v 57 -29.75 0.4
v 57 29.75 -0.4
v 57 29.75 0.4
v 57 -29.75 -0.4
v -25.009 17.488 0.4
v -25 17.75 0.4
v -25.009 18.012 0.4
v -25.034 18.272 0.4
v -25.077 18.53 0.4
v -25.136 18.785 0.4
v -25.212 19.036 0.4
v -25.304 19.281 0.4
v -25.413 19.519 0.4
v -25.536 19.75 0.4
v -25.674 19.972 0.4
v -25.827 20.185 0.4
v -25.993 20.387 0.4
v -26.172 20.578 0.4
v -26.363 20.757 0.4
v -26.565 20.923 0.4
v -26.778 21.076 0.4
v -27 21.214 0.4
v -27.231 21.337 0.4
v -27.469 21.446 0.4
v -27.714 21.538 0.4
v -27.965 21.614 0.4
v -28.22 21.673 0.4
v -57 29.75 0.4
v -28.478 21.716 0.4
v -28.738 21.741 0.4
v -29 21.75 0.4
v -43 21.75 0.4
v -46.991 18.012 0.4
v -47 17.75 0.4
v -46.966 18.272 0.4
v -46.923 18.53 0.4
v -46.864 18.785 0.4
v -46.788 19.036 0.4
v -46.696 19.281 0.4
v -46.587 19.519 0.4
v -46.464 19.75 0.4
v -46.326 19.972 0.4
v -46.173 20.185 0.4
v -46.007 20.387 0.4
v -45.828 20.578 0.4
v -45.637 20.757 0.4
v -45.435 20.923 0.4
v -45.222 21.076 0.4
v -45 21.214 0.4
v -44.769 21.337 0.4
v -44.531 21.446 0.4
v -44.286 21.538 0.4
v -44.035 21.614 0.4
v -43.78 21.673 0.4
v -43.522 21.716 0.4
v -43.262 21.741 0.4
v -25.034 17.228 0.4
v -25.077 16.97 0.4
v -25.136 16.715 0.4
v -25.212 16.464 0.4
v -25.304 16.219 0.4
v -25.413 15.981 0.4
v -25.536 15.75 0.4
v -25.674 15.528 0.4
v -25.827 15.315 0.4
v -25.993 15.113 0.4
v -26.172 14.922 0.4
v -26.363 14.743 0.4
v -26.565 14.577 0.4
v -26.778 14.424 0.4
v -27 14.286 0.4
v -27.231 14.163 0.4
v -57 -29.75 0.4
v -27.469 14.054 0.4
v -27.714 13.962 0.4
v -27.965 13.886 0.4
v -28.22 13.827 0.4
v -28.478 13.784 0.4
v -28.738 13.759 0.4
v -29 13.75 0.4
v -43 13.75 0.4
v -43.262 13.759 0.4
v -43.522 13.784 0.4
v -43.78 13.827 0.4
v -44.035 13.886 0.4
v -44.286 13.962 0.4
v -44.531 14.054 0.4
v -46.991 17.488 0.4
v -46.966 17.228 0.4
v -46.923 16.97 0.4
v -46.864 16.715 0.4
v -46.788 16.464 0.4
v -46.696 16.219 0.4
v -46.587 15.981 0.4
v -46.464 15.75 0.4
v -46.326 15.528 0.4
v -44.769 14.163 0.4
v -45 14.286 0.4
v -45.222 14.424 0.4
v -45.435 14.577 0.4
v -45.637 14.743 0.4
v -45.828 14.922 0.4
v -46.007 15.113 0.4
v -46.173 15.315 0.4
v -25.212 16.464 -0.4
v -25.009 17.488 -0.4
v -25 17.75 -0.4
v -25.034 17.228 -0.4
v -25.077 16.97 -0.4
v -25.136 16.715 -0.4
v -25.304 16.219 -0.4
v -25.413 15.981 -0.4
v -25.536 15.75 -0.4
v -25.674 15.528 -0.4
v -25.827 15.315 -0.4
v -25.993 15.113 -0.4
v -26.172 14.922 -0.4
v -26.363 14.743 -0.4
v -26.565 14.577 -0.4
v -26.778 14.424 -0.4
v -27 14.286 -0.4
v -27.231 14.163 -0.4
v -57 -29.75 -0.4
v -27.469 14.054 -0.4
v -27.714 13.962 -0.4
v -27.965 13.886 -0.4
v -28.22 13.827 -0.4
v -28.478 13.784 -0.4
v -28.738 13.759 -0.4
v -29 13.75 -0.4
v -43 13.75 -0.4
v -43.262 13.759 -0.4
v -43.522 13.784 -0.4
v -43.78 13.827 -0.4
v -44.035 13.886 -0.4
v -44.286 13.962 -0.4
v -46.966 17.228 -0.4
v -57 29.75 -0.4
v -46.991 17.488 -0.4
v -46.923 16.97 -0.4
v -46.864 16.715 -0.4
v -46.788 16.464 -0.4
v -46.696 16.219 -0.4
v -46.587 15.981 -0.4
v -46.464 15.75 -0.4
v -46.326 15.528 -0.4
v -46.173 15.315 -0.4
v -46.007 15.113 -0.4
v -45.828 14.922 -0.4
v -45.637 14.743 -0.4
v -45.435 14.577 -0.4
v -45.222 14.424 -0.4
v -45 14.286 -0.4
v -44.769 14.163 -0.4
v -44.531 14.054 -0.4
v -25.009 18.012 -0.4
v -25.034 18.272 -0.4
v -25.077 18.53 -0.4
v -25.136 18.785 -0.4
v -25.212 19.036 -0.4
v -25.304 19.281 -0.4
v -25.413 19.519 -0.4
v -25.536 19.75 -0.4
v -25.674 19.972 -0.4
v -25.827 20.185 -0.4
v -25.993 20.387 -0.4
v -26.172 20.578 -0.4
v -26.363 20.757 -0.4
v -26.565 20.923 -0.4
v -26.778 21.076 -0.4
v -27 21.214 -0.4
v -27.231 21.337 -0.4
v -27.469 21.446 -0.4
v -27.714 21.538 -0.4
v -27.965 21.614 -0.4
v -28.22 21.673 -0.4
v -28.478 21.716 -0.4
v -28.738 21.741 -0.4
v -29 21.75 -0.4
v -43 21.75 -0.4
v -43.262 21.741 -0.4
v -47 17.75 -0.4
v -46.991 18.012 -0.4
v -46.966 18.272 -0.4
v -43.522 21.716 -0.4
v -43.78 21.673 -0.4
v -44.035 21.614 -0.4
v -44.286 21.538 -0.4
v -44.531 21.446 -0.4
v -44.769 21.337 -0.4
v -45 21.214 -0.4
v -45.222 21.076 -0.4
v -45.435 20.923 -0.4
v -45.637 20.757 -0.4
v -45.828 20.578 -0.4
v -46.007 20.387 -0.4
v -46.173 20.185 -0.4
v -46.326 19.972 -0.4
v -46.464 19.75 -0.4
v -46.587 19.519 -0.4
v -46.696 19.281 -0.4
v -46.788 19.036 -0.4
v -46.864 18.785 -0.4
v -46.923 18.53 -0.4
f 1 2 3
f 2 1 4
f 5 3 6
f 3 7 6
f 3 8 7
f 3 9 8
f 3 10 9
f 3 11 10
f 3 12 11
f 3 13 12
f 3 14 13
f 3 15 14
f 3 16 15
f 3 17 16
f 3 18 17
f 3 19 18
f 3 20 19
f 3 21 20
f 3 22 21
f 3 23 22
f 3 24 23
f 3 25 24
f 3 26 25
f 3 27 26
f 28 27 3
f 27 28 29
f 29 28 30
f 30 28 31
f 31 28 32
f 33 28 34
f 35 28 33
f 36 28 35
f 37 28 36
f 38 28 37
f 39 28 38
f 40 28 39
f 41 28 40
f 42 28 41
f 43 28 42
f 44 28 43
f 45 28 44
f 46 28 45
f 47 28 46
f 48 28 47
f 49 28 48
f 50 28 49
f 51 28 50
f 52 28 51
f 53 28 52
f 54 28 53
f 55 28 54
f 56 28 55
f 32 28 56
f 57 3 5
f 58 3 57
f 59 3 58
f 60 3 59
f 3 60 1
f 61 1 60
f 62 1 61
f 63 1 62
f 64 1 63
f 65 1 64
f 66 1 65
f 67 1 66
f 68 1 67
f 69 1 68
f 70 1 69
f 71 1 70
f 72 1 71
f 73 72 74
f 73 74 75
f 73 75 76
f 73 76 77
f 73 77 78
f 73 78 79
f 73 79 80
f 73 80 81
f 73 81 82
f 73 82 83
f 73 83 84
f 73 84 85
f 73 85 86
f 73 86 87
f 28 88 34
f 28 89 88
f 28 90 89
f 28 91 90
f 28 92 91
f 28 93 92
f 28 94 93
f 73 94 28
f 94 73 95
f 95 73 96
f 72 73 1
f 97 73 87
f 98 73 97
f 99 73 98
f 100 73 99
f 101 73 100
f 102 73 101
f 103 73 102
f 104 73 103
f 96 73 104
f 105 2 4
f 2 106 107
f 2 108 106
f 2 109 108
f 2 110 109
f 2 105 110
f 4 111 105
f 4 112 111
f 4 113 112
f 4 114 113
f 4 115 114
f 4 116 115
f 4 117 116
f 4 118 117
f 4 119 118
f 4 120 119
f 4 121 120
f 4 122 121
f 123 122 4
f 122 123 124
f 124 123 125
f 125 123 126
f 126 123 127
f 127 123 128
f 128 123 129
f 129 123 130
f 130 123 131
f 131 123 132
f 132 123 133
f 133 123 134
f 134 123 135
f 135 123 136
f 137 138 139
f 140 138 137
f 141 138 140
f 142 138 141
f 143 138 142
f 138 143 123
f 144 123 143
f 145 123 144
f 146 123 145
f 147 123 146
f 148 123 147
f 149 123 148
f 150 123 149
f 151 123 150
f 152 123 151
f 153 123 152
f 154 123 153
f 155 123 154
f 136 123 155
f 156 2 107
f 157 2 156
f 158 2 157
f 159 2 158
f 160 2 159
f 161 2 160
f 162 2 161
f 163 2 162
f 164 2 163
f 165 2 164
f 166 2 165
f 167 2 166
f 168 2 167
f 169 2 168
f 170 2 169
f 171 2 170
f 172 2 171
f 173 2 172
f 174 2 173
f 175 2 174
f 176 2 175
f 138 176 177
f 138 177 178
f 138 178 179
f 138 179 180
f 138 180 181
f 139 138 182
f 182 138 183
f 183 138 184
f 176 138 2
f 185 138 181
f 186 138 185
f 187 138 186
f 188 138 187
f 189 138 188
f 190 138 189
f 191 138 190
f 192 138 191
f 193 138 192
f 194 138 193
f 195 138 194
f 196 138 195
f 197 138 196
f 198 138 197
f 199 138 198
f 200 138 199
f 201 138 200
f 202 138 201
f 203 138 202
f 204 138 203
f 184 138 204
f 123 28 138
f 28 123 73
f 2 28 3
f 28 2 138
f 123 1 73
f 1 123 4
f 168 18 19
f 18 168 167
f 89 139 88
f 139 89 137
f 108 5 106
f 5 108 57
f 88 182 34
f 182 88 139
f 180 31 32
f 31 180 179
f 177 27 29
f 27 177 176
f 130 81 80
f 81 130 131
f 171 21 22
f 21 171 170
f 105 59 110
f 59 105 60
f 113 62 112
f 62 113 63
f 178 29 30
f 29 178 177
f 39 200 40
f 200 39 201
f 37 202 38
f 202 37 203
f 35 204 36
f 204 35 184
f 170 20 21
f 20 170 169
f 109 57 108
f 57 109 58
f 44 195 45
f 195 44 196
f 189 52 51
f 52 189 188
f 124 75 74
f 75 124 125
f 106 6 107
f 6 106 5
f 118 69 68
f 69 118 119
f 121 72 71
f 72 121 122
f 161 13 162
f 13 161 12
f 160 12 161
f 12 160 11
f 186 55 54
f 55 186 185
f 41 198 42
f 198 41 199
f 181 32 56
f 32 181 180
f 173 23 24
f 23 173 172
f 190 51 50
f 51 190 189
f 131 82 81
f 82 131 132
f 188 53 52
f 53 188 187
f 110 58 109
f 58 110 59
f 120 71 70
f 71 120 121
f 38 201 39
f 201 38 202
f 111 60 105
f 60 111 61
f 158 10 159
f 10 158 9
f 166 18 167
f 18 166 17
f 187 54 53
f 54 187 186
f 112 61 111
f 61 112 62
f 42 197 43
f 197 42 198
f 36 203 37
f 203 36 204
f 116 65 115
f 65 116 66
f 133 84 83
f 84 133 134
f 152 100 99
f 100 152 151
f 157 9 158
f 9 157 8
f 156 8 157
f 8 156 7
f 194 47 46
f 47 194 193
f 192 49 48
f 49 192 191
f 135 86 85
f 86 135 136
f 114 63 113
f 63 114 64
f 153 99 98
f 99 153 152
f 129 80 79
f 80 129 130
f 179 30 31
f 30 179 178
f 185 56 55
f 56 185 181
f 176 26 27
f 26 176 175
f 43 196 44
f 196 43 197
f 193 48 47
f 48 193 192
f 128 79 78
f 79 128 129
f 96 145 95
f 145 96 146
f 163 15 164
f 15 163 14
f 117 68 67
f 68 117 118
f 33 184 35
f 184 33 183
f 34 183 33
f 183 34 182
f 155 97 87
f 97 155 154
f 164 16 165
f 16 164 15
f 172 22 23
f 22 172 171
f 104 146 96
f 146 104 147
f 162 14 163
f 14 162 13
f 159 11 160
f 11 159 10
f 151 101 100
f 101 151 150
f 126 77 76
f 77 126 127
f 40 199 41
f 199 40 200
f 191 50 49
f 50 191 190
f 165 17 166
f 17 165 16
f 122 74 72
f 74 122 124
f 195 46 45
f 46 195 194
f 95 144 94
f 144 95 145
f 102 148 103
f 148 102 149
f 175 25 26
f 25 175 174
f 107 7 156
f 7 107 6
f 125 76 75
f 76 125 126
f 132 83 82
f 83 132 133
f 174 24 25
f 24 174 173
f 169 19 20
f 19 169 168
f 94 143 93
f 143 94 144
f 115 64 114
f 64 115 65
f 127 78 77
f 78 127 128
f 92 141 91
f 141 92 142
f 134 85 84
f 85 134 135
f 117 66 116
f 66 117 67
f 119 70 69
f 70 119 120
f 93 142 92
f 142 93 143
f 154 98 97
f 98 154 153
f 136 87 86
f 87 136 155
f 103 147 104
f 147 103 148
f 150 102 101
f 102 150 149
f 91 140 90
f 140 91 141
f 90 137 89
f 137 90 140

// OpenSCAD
$fn=96;

plate_L = 114.0;
plate_W = 59.5;
plate_T = 0.8;

slot_len = 22.0;
slot_wid = 8.0;

edge_x = 10.0;
edge_y = 8.0;

module obround2d(len, wid){
    r = wid/2;
    hull(){
        translate([-(len/2 - r), 0]) circle(r=r);
        translate([ (len/2 - r), 0]) circle(r=r);
    }
}

module plate_with_slot(){
    difference(){
        translate([0,0,0]) cube([plate_L, plate_W, plate_T], center=true);
        translate([-(plate_L/2 - edge_x - slot_len/2), (plate_W/2 - edge_y - slot_wid/2), 0])
            linear_extrude(height=plate_T+2, center=true)
                obround2d(slot_len, slot_wid);
    }
}

plate_with_slot();
